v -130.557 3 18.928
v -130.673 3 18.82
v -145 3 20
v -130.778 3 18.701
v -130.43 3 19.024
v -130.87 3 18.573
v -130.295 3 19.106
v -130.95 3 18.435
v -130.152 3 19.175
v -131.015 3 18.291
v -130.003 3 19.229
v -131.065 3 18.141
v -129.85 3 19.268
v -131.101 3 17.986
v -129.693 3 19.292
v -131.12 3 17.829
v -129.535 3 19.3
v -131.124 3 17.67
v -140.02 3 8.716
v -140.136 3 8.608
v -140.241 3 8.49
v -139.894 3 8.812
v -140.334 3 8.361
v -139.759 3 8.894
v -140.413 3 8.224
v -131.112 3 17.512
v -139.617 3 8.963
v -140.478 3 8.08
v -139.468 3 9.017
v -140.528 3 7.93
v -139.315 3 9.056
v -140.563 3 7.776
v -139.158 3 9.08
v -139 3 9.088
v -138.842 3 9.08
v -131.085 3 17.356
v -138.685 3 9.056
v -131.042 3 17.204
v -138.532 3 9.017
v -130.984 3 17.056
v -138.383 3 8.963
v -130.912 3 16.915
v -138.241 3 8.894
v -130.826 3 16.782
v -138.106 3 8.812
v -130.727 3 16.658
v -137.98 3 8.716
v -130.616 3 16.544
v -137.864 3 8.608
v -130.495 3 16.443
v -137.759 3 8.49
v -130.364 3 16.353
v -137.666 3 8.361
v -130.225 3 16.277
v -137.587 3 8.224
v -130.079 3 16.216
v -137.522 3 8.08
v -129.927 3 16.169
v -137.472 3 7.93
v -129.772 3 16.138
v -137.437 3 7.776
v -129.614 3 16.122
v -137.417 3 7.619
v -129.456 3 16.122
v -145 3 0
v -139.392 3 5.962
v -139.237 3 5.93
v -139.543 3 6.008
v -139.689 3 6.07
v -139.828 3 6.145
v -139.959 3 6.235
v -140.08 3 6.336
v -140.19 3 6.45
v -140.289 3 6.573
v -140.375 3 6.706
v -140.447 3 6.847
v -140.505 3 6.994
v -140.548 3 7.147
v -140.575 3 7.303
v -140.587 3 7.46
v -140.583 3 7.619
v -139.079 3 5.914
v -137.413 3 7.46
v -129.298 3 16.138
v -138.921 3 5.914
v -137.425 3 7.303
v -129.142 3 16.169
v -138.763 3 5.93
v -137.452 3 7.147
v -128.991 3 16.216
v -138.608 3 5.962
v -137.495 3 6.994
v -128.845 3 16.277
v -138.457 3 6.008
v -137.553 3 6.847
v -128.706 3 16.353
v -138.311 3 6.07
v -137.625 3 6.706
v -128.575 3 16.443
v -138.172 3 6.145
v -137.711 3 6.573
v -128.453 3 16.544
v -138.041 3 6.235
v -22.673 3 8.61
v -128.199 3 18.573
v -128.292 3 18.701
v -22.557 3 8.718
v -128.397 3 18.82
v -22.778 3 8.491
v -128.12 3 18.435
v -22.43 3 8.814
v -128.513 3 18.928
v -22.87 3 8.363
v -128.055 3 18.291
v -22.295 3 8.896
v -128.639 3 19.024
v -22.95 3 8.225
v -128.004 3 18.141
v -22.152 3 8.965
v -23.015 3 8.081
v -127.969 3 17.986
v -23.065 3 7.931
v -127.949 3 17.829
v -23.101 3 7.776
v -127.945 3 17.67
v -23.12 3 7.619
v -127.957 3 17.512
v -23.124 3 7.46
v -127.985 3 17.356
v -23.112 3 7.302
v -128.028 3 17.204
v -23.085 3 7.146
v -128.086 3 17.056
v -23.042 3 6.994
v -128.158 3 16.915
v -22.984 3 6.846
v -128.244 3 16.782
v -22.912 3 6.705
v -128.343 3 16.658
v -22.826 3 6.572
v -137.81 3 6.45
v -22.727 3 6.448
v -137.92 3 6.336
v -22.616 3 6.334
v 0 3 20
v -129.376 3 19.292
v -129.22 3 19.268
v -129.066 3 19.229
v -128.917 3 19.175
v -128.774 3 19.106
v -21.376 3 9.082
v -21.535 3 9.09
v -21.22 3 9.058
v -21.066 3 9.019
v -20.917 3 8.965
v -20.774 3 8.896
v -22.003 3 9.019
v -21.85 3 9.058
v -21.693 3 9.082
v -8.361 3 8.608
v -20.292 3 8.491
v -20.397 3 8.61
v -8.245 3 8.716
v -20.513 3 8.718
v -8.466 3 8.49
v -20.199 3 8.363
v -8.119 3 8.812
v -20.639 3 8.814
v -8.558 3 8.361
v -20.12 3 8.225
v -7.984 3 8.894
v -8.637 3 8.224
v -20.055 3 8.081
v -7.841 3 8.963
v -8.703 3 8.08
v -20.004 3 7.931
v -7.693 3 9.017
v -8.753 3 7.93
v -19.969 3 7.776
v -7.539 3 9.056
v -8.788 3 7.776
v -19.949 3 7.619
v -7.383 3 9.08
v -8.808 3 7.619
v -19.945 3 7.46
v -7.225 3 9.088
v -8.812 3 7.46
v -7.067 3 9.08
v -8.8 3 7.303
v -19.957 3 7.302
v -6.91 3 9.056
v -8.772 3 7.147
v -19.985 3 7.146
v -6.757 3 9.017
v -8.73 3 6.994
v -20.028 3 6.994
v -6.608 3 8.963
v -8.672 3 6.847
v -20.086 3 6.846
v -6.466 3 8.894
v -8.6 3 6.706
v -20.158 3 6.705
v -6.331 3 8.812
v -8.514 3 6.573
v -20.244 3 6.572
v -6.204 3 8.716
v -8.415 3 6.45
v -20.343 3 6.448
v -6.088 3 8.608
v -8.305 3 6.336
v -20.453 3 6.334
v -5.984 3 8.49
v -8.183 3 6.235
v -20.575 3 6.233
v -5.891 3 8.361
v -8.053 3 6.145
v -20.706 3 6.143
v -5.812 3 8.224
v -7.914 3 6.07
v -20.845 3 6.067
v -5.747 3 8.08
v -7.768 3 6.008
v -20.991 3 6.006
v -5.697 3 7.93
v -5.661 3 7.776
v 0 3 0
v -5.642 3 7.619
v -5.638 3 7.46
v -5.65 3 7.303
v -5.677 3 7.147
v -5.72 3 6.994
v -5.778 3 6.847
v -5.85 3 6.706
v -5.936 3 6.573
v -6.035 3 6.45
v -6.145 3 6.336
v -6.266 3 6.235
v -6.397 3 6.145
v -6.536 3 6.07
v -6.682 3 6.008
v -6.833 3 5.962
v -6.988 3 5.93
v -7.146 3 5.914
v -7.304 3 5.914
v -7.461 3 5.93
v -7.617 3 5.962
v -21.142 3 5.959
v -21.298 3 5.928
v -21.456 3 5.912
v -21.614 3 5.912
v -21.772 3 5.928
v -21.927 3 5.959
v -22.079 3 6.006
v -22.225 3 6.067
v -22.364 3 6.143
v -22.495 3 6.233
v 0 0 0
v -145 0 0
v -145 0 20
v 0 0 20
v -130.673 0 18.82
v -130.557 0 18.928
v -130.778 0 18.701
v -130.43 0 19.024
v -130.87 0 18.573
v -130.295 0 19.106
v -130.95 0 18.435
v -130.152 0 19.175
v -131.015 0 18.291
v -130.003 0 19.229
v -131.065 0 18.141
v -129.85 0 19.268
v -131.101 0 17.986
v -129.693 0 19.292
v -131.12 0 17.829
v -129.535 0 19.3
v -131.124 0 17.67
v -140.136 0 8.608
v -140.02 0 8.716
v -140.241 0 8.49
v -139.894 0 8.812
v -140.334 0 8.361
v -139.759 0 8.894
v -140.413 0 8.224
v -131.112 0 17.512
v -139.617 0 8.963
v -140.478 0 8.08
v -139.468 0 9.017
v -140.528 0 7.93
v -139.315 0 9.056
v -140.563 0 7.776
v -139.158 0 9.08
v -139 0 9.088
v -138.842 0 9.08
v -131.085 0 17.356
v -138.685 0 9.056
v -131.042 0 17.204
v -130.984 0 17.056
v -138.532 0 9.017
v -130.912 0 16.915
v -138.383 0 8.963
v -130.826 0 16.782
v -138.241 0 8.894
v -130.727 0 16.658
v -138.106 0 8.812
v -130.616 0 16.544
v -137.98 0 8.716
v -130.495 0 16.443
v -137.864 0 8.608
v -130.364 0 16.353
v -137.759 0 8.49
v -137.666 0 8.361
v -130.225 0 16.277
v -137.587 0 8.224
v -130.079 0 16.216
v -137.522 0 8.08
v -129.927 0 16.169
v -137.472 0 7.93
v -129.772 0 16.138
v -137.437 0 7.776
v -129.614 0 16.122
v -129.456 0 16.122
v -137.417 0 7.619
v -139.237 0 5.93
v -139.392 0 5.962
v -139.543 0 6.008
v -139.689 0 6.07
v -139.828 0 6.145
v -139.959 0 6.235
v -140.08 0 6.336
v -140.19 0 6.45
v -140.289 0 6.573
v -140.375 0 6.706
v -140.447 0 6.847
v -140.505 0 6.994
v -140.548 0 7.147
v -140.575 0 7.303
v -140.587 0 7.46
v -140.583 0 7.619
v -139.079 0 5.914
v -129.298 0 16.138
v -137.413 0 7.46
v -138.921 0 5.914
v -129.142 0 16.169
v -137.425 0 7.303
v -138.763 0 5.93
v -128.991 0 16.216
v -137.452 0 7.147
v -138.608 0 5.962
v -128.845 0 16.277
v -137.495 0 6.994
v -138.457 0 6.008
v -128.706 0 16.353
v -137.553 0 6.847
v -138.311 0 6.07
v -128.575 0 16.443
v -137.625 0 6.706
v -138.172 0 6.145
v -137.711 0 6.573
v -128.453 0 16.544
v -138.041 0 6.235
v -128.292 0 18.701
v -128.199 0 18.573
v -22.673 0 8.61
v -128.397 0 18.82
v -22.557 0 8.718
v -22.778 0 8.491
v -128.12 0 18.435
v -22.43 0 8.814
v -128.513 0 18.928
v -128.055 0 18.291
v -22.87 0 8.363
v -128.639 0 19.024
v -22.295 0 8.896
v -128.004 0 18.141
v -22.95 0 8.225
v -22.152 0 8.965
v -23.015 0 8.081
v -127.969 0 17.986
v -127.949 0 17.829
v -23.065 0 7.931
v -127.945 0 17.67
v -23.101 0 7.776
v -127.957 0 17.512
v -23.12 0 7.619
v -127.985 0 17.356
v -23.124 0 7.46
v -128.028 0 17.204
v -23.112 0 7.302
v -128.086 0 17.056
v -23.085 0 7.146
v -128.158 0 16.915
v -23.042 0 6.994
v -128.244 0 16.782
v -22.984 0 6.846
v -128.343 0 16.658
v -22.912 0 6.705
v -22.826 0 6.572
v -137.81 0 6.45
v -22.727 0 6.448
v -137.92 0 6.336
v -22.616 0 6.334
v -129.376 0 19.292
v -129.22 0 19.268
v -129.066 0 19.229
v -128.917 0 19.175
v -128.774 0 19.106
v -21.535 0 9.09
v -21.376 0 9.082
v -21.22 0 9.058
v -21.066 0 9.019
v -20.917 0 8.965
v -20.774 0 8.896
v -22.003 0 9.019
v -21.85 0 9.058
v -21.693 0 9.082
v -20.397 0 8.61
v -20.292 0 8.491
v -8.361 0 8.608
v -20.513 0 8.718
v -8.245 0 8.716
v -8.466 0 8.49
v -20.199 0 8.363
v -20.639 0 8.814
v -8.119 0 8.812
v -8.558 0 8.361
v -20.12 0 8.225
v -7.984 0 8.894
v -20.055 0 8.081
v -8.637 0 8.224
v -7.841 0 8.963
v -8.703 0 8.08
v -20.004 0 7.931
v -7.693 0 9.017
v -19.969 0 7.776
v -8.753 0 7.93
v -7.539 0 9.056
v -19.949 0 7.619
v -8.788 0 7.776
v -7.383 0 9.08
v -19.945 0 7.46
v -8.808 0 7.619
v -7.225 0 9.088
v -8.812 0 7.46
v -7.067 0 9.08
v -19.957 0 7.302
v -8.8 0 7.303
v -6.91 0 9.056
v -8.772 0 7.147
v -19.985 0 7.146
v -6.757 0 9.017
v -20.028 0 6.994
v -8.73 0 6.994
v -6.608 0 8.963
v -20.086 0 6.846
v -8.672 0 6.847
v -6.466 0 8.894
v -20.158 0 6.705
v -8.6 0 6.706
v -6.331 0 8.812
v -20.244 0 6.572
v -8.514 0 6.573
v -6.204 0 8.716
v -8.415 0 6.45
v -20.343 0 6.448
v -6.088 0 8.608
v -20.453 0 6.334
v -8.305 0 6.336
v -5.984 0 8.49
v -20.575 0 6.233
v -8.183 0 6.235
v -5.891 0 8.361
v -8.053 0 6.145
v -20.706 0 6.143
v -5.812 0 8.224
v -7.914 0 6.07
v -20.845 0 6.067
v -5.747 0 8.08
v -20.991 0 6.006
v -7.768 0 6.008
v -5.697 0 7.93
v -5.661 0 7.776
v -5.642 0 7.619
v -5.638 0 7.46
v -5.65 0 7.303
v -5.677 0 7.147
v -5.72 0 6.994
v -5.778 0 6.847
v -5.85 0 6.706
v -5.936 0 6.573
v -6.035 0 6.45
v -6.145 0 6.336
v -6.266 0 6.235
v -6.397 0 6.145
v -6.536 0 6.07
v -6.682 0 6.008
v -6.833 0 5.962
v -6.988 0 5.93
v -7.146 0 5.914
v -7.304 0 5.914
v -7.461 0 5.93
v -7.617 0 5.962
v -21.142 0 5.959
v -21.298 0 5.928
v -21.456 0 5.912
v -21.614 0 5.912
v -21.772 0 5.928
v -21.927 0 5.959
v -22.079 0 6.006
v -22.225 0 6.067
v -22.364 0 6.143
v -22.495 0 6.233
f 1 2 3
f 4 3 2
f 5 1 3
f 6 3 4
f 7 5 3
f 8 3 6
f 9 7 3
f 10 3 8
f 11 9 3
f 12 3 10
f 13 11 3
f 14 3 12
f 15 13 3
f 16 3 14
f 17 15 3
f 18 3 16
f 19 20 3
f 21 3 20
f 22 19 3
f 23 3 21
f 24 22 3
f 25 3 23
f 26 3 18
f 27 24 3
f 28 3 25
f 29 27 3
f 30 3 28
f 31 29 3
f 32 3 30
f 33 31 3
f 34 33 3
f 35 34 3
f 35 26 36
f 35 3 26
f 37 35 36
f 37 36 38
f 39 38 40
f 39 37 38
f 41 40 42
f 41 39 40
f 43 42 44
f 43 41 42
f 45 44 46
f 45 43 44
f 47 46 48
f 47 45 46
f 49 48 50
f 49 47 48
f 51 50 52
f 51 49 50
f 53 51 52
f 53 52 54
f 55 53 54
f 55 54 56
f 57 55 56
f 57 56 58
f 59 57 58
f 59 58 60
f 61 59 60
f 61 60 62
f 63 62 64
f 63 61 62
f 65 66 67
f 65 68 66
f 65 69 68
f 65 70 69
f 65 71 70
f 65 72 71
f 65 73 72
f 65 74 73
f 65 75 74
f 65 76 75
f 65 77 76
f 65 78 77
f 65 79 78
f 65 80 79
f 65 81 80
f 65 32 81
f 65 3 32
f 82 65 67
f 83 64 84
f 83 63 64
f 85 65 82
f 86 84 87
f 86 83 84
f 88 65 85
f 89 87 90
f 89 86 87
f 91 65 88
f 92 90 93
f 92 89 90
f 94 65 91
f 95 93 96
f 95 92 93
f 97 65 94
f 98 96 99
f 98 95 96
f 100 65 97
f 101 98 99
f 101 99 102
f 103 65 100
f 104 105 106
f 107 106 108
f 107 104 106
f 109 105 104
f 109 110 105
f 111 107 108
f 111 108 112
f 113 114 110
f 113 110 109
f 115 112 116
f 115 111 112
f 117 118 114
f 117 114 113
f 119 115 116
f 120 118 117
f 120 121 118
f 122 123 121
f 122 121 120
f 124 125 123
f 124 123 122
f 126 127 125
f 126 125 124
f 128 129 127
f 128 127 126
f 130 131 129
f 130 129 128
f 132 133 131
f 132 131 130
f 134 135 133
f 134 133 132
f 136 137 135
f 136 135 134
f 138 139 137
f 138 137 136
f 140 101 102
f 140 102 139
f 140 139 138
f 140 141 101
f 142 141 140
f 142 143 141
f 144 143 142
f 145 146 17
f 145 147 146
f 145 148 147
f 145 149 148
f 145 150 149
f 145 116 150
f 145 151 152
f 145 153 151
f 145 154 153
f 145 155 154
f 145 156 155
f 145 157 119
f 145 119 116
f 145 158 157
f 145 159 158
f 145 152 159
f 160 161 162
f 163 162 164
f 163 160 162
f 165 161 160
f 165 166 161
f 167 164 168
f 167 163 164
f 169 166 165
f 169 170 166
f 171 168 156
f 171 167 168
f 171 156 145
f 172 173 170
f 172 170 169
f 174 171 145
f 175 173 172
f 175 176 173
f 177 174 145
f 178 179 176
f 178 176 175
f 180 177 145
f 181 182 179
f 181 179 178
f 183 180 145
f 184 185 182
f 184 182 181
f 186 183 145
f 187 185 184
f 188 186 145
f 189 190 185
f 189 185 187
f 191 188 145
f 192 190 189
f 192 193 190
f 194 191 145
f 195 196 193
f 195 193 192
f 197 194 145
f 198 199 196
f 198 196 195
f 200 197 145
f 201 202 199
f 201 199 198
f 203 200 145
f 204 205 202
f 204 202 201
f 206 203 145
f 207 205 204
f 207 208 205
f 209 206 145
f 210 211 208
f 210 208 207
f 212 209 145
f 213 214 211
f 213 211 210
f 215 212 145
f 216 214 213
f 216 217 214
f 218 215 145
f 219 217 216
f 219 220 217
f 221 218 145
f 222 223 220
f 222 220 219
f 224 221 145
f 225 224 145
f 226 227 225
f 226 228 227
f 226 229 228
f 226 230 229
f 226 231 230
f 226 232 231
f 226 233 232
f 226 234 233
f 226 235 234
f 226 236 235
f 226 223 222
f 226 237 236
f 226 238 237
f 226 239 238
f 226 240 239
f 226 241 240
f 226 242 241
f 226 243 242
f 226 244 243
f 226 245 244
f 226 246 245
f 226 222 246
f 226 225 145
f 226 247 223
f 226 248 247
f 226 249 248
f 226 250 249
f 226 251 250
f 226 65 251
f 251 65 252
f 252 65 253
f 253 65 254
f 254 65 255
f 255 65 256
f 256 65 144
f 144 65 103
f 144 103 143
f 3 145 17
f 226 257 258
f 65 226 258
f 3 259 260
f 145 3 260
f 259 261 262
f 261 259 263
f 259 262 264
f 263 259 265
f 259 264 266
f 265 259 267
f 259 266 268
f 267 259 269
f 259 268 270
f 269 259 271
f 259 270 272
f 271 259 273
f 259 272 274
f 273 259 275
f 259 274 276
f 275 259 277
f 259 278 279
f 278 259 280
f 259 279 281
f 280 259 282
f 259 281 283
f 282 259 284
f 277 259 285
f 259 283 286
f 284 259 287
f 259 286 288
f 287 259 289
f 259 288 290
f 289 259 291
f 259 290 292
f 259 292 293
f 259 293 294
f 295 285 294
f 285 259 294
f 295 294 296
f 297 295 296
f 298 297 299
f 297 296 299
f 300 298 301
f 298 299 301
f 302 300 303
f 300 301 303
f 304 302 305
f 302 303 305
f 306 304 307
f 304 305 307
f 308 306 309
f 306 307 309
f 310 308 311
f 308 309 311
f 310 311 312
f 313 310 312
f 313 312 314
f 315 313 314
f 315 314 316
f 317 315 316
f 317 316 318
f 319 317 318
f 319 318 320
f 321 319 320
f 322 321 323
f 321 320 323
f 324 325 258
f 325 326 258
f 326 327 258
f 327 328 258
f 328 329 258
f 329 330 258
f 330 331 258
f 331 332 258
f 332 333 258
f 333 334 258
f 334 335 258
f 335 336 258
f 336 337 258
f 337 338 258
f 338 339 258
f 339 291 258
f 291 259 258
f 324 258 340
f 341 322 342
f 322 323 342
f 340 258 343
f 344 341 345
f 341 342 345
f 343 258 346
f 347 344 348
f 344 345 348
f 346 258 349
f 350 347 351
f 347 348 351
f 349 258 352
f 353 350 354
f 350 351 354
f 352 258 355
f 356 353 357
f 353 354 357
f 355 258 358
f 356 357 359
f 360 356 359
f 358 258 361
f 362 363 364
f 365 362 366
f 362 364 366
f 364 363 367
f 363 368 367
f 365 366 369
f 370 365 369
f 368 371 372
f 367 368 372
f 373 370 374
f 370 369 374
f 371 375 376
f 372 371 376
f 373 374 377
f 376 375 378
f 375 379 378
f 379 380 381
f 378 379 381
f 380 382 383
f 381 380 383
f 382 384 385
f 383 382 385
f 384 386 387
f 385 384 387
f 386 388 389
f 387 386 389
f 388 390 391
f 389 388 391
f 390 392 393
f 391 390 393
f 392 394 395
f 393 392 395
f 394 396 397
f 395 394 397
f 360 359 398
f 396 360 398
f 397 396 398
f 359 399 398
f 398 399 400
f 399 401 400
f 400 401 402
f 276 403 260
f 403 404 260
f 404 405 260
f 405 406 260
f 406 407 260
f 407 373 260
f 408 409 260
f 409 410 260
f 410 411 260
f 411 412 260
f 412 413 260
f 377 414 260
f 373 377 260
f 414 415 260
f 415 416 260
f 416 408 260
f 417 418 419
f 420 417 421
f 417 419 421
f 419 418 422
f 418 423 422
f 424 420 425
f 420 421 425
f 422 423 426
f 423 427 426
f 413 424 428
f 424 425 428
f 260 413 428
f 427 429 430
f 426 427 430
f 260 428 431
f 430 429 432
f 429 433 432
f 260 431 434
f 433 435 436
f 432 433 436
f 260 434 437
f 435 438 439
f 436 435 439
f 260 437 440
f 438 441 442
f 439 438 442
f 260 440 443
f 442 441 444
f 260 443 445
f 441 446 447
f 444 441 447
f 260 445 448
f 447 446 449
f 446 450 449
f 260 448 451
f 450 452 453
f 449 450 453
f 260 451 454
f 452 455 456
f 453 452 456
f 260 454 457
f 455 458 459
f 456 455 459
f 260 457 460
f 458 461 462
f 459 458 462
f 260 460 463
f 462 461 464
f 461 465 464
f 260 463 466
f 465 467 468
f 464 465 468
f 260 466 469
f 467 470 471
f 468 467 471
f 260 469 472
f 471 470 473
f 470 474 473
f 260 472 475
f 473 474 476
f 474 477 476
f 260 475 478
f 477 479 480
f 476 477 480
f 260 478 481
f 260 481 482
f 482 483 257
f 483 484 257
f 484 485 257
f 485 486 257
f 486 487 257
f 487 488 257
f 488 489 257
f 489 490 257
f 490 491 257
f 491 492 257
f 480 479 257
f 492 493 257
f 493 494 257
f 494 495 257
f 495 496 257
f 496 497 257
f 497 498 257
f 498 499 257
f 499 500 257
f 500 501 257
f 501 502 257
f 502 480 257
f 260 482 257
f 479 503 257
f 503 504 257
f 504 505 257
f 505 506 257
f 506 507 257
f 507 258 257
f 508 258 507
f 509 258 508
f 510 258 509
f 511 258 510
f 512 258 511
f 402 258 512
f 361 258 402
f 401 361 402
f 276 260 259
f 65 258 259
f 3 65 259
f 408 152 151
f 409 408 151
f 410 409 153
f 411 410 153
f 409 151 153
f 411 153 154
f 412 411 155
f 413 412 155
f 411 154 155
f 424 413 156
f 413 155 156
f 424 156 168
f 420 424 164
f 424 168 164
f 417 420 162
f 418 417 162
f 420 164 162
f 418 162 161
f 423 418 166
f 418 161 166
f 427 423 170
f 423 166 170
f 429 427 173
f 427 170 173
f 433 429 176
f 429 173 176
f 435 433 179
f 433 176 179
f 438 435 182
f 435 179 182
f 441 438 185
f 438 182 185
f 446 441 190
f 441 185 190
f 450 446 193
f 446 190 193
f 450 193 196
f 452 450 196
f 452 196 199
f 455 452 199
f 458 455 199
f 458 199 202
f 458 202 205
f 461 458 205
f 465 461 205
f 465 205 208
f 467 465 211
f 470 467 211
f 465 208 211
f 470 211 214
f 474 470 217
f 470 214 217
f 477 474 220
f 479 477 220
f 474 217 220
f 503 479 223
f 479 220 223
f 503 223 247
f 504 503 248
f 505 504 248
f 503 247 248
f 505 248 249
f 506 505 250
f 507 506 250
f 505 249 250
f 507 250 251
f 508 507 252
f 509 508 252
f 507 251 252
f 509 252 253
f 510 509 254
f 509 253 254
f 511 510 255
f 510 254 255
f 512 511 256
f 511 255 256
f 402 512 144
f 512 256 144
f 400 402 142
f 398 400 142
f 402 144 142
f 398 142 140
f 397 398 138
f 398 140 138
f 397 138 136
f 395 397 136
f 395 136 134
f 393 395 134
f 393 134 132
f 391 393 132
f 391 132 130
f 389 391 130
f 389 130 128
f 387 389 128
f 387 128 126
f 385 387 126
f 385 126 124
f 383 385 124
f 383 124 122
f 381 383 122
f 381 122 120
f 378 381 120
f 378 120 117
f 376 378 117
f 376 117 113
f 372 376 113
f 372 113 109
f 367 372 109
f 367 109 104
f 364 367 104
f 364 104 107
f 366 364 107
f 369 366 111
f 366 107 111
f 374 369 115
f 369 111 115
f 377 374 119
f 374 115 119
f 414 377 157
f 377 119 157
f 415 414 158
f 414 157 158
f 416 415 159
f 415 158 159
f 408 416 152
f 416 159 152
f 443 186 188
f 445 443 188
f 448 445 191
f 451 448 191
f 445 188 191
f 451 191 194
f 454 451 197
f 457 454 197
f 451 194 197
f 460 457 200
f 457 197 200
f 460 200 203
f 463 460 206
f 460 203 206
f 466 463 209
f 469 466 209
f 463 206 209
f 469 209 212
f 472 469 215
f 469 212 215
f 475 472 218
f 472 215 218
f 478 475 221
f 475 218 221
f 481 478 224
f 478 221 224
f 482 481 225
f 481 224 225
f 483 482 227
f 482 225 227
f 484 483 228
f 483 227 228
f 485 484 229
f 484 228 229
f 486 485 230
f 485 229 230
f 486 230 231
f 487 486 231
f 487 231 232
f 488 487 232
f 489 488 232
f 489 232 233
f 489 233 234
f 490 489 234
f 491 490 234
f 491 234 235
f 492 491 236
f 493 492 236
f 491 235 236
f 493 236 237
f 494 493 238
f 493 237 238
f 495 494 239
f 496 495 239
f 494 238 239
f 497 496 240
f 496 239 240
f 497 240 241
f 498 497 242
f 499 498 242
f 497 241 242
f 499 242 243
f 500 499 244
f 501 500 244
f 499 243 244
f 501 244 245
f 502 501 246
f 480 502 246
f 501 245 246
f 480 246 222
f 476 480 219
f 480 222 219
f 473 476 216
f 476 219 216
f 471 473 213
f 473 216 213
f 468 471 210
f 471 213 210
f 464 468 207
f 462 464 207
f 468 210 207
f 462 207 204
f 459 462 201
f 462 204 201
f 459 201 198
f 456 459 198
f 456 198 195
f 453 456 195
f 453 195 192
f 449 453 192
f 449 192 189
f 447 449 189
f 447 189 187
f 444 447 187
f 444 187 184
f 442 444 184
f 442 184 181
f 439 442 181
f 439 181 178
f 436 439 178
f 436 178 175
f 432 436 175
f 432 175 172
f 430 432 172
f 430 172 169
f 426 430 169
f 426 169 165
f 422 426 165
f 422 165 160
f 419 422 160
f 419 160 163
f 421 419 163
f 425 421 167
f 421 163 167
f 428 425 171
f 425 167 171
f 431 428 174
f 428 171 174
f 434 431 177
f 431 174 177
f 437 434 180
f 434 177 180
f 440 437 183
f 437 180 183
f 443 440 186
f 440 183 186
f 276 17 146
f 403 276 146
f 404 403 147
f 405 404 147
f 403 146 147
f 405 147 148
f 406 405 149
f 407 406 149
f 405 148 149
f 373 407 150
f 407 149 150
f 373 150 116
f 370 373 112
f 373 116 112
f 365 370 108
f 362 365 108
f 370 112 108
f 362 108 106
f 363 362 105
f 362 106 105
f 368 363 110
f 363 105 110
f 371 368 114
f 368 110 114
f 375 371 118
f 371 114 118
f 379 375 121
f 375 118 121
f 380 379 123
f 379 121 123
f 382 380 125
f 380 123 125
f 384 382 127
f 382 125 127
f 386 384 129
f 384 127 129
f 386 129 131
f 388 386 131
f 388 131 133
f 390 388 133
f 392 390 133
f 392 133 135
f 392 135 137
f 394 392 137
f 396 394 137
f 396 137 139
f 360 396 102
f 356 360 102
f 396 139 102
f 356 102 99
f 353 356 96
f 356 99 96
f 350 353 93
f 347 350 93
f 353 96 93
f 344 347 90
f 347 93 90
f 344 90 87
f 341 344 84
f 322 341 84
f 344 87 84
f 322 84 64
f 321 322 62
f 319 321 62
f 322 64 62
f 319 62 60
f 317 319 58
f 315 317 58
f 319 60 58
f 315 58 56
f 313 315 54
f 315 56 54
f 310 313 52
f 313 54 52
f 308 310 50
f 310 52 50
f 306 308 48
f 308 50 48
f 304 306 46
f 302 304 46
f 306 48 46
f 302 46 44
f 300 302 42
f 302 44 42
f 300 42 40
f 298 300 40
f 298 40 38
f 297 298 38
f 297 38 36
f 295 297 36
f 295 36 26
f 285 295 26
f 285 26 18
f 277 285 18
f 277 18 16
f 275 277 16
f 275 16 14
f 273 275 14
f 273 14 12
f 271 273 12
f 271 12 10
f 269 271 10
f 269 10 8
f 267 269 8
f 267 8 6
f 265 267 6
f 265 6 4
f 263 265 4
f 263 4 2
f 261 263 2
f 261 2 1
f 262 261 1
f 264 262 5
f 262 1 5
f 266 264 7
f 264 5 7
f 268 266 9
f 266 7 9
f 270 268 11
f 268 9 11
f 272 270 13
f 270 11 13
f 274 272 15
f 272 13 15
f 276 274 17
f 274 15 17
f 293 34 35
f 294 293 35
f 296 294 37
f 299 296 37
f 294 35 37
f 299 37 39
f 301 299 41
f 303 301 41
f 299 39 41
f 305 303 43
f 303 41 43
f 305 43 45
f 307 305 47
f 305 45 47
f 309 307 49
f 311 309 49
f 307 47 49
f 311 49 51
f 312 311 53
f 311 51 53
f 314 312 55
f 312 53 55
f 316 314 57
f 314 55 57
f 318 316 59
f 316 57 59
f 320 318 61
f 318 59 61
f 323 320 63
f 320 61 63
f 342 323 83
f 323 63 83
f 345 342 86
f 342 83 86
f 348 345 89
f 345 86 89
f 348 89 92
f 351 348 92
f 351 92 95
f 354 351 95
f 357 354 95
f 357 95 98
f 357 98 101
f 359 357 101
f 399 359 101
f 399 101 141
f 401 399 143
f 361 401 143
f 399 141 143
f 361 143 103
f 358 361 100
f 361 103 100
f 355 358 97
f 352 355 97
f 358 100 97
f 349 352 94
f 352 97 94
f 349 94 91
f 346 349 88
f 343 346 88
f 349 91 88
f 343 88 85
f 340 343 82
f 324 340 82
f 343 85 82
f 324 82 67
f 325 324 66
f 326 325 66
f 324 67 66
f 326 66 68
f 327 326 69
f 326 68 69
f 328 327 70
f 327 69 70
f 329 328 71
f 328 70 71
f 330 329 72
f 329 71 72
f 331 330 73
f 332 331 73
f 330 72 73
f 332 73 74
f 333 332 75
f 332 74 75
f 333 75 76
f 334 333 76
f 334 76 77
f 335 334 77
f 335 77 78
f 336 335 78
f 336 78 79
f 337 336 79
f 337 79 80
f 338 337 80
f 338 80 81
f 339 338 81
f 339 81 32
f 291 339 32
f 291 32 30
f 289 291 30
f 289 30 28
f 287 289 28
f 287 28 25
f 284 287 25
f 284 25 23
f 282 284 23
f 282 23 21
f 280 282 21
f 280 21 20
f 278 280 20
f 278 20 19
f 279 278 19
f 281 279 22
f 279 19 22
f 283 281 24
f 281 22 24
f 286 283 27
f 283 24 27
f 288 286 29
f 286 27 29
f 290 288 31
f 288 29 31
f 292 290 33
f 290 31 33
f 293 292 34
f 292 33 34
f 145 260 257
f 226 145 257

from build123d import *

# Parameters (mm, degrees)
EXTRUDE1_DEPTH = 3
SKETCH2_R      = 1.5875
EXTRUDE2_DEPTH = 3
SKETCH4_R      = 1.59
EXTRUDE3_DEPTH = 3
SKETCH5_R      = 1.59
EXTRUDE5_DEPTH = 3


with BuildPart() as part:
    # Sketch1 → Extrude1 (new body)
    with BuildSketch(Plane(origin=(0, 0, 0), x_dir=(1, 0, 0), z_dir=(0, 1, 0))):
        Polygon((0, 0), (-145, 0), (-145, -20), (-24, -20), (0, -20), align=None)
    extrude(amount=EXTRUDE1_DEPTH)

    # Sketch2 → Extrude2 (cut)
    with BuildSketch(Plane(origin=(0, 3, 0), x_dir=(1, 0, 0), z_dir=(0, 1, 0))):
        with Locations(Location((-139, -7.5, 0), (0, 0, 270))):
            Circle(SKETCH2_R)
        with Locations(Location((-7.2248, -7.5, 0), (0, 0, 270))):
            Circle(SKETCH2_R)
        with Locations((-7.2248, -99.358338)):
            Circle(SKETCH2_R)
    extrude(amount=-EXTRUDE2_DEPTH, mode=Mode.SUBTRACT)

    # Sketch4 → Extrude3 (cut)
    with BuildSketch(Plane(origin=(0, 3, 0), x_dir=(1, 0, 0), z_dir=(0, 1, 0))):
        with Locations(Location((-21.5348, -7.5, 0), (0, 0, 270))):
            Circle(SKETCH4_R)
    extrude(amount=-EXTRUDE3_DEPTH, mode=Mode.SUBTRACT)

    # Sketch5 → Extrude5 (cut)
    with BuildSketch(Plane(origin=(0, 3, 0), x_dir=(1, 0, 0), z_dir=(0, 1, 0))):
        with Locations(Location((-129.5348, -17.71, 0), (0, 0, 270))):
            Circle(SKETCH5_R)
    extrude(amount=-EXTRUDE5_DEPTH, mode=Mode.SUBTRACT)


solid = part.part
